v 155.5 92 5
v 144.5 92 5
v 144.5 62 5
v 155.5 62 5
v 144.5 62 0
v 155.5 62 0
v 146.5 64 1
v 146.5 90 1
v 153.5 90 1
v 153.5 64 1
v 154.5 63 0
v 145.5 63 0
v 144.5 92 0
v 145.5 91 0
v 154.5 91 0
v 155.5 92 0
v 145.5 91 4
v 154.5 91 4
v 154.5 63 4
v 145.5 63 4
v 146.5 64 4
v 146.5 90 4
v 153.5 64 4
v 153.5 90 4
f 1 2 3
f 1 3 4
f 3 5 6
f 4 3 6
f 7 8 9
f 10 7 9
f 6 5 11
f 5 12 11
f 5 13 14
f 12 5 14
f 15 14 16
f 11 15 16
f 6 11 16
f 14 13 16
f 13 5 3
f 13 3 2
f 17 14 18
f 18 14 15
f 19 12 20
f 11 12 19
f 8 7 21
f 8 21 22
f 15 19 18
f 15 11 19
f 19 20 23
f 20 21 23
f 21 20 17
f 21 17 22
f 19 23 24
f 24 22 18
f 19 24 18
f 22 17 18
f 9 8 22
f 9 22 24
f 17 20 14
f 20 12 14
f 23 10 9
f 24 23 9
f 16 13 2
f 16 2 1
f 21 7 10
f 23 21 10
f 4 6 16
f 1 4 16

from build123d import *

# Parameters (mm, degrees)
SKETCH042_W   = 9
SKETCH042_H   = 28
PAD027_DEPTH  = 1
SKETCH043_W   = 9
SKETCH043_H   = 28
SKETCH043_W_2 = 7
SKETCH043_H_2 = 26
PAD028_DEPTH  = 3
BOX002_W      = 11
BOX002_H      = 30
BOX002_DEPTH  = 5


with BuildPart() as sidemold:
    # Sketch042 → Pad027 (new body)
    with BuildSketch(Plane.XY):
        Rectangle(SKETCH042_W, SKETCH042_H)
    extrude(amount=PAD027_DEPTH)

    # Sketch043 (on Face6 of Pad027) → Pad028 (join)
    with BuildSketch(Plane.XY.offset(1)):
        Rectangle(SKETCH043_W, SKETCH043_H)
        Rectangle(SKETCH043_W_2, SKETCH043_H_2, mode=Mode.SUBTRACT)
    extrude(amount=PAD028_DEPTH)


with BuildPart() as sidemold_1:
    # Body009 placement: moved
    add(sidemold.part.moved(Location((150, 35, 0))))


with BuildPart() as short_side_mold:
    # Box002 → Box002 (new body)
    with BuildSketch(Plane(origin=(144.5, 20, 0), x_dir=(1, 0, 0), z_dir=(0, 0, 1))):
        with Locations((5.5, 15)):
            Rectangle(BOX002_W, BOX002_H)
    extrude(amount=BOX002_DEPTH)

    # Cut002: cut SideMold
    add(sidemold_1.part, mode=Mode.SUBTRACT)


with BuildPart() as short_side_mold_1:
    # Cut002 placement: moved
    add(short_side_mold.part.moved(Location((0, 42, 0))))


solid = short_side_mold_1.part
